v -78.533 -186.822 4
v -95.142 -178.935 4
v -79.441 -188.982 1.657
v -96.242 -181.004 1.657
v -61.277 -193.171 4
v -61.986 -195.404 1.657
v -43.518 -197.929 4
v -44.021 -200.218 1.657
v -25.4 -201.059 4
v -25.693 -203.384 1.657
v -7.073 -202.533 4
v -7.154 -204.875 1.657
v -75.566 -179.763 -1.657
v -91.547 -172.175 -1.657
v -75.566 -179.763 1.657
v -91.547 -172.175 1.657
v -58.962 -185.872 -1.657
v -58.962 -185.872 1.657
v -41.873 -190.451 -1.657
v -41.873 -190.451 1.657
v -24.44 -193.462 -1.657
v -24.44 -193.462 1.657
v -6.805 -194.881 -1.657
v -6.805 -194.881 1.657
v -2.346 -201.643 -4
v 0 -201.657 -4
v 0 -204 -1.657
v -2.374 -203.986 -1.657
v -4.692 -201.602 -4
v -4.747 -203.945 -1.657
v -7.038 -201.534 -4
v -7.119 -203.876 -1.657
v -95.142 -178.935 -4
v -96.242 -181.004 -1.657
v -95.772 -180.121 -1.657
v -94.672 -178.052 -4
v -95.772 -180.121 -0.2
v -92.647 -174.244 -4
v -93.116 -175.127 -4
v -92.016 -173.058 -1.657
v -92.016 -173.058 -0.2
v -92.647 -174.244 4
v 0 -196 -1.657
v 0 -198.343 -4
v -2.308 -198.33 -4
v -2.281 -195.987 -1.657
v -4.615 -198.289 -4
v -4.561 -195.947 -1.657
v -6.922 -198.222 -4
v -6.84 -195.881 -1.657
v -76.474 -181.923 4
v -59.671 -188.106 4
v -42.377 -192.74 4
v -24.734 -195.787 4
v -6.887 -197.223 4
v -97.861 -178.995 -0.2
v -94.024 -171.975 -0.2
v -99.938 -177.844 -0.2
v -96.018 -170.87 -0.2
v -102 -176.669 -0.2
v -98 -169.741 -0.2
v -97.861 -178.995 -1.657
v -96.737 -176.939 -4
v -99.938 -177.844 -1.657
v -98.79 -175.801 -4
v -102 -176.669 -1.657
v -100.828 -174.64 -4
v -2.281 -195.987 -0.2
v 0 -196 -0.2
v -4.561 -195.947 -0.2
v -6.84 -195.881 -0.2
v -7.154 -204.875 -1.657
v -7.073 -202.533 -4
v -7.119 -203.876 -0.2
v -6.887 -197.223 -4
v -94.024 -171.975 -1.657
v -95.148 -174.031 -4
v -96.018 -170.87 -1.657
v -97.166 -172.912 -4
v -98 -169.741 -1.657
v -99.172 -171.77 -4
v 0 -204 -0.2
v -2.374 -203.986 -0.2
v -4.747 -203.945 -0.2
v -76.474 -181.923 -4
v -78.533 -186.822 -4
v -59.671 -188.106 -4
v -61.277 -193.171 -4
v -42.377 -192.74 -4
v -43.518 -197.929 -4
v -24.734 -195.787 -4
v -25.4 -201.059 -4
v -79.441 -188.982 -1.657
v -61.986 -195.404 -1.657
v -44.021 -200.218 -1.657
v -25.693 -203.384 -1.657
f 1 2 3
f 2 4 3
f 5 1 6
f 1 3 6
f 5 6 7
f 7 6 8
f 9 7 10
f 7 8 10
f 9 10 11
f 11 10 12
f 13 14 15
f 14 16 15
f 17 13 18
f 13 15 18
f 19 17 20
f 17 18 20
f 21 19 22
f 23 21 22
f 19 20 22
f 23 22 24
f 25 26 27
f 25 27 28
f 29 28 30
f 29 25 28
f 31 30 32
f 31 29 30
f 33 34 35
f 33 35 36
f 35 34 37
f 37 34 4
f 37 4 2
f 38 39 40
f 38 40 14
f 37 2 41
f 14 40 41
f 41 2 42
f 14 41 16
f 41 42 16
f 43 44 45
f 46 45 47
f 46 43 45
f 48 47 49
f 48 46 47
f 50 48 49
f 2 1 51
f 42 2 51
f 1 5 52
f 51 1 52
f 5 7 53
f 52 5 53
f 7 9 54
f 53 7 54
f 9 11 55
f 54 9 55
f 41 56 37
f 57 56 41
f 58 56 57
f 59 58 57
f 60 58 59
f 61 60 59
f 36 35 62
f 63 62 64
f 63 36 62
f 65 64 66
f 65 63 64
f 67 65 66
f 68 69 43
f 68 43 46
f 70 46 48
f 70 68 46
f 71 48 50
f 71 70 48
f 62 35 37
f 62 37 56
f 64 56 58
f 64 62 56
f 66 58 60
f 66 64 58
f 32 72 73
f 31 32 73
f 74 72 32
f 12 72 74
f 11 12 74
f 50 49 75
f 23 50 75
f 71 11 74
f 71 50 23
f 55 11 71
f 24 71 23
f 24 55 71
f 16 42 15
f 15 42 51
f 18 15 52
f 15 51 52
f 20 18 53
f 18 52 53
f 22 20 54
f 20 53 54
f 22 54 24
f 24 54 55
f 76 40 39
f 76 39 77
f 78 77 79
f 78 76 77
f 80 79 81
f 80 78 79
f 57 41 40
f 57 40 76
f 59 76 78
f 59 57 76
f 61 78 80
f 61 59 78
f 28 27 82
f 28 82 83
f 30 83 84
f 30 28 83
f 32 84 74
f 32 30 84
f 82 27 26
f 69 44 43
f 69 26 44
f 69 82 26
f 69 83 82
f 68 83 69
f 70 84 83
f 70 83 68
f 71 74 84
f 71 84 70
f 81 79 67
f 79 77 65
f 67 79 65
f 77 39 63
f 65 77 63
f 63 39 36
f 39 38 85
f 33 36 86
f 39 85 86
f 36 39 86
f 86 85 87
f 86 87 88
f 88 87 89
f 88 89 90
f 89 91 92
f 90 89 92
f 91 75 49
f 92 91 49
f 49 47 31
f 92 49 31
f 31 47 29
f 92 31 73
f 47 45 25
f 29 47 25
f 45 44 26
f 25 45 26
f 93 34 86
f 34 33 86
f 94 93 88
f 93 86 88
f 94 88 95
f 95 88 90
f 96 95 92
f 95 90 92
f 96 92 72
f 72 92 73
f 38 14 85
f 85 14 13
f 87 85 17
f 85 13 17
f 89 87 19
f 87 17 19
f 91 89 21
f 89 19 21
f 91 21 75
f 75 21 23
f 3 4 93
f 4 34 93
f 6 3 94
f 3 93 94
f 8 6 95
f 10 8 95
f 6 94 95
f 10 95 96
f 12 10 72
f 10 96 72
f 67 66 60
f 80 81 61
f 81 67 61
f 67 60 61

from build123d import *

# Parameters (mm, degrees)
F3_ANGLE_BACK = 15
F3_ANGLE      = 30
F4_ANGLE_BACK = 13
F4_ANGLE      = 26
F5_ANGLE      = 15


# Not quite as in the source:
# - a feature of the source that left no trace in its solid (it failed there, or was rolled back) is left out


with BuildPart() as f3:
    # F0 (on Right) → F3 (revolve)
    with BuildSketch(Plane.YZ, mode=Mode.PRIVATE) as f3_sk:
        Polygon((-198.3431457505, -4), (-196, -1.6568542495), (-196, -0.2), (-204, -0.2), (-204, -1.6568542495), (-201.6568542495, -4), align=None)
    revolve(f3_sk.sketch.rotate(Axis((0, 0, 14.9391144514), (0, 0, -1)), -F3_ANGLE_BACK), axis=Axis((0, 0, 14.9391144514), (0, 0, -1)), revolution_arc=F3_ANGLE)

    # F2 (on Right) → F4 (revolve)
    with BuildSketch(Plane.YZ, mode=Mode.PRIVATE) as f4_sk:
        Polygon((-195, 1.6568542495), (-197.3431457505, 4), (-202.6568542495, 4), (-205, 1.6568542495), (-205, -1.6568542495), (-202.6568542495, -4), (-197.3431457505, -4), (-195, -1.6568542495), align=None)
    revolve(f4_sk.sketch.rotate(Axis((0, 0, 27.1144676954), (0, 0, 1)), -F4_ANGLE_BACK), axis=Axis((0, 0, 27.1144676954), (0, 0, 1)), revolution_arc=F4_ANGLE)


with BuildPart() as f3_1:
    # F5: moved
    add(f3.part.rotate(Axis((0, 0, 14.9391144514), (0, 0, -1)), F5_ANGLE))


solid = f3_1.part
